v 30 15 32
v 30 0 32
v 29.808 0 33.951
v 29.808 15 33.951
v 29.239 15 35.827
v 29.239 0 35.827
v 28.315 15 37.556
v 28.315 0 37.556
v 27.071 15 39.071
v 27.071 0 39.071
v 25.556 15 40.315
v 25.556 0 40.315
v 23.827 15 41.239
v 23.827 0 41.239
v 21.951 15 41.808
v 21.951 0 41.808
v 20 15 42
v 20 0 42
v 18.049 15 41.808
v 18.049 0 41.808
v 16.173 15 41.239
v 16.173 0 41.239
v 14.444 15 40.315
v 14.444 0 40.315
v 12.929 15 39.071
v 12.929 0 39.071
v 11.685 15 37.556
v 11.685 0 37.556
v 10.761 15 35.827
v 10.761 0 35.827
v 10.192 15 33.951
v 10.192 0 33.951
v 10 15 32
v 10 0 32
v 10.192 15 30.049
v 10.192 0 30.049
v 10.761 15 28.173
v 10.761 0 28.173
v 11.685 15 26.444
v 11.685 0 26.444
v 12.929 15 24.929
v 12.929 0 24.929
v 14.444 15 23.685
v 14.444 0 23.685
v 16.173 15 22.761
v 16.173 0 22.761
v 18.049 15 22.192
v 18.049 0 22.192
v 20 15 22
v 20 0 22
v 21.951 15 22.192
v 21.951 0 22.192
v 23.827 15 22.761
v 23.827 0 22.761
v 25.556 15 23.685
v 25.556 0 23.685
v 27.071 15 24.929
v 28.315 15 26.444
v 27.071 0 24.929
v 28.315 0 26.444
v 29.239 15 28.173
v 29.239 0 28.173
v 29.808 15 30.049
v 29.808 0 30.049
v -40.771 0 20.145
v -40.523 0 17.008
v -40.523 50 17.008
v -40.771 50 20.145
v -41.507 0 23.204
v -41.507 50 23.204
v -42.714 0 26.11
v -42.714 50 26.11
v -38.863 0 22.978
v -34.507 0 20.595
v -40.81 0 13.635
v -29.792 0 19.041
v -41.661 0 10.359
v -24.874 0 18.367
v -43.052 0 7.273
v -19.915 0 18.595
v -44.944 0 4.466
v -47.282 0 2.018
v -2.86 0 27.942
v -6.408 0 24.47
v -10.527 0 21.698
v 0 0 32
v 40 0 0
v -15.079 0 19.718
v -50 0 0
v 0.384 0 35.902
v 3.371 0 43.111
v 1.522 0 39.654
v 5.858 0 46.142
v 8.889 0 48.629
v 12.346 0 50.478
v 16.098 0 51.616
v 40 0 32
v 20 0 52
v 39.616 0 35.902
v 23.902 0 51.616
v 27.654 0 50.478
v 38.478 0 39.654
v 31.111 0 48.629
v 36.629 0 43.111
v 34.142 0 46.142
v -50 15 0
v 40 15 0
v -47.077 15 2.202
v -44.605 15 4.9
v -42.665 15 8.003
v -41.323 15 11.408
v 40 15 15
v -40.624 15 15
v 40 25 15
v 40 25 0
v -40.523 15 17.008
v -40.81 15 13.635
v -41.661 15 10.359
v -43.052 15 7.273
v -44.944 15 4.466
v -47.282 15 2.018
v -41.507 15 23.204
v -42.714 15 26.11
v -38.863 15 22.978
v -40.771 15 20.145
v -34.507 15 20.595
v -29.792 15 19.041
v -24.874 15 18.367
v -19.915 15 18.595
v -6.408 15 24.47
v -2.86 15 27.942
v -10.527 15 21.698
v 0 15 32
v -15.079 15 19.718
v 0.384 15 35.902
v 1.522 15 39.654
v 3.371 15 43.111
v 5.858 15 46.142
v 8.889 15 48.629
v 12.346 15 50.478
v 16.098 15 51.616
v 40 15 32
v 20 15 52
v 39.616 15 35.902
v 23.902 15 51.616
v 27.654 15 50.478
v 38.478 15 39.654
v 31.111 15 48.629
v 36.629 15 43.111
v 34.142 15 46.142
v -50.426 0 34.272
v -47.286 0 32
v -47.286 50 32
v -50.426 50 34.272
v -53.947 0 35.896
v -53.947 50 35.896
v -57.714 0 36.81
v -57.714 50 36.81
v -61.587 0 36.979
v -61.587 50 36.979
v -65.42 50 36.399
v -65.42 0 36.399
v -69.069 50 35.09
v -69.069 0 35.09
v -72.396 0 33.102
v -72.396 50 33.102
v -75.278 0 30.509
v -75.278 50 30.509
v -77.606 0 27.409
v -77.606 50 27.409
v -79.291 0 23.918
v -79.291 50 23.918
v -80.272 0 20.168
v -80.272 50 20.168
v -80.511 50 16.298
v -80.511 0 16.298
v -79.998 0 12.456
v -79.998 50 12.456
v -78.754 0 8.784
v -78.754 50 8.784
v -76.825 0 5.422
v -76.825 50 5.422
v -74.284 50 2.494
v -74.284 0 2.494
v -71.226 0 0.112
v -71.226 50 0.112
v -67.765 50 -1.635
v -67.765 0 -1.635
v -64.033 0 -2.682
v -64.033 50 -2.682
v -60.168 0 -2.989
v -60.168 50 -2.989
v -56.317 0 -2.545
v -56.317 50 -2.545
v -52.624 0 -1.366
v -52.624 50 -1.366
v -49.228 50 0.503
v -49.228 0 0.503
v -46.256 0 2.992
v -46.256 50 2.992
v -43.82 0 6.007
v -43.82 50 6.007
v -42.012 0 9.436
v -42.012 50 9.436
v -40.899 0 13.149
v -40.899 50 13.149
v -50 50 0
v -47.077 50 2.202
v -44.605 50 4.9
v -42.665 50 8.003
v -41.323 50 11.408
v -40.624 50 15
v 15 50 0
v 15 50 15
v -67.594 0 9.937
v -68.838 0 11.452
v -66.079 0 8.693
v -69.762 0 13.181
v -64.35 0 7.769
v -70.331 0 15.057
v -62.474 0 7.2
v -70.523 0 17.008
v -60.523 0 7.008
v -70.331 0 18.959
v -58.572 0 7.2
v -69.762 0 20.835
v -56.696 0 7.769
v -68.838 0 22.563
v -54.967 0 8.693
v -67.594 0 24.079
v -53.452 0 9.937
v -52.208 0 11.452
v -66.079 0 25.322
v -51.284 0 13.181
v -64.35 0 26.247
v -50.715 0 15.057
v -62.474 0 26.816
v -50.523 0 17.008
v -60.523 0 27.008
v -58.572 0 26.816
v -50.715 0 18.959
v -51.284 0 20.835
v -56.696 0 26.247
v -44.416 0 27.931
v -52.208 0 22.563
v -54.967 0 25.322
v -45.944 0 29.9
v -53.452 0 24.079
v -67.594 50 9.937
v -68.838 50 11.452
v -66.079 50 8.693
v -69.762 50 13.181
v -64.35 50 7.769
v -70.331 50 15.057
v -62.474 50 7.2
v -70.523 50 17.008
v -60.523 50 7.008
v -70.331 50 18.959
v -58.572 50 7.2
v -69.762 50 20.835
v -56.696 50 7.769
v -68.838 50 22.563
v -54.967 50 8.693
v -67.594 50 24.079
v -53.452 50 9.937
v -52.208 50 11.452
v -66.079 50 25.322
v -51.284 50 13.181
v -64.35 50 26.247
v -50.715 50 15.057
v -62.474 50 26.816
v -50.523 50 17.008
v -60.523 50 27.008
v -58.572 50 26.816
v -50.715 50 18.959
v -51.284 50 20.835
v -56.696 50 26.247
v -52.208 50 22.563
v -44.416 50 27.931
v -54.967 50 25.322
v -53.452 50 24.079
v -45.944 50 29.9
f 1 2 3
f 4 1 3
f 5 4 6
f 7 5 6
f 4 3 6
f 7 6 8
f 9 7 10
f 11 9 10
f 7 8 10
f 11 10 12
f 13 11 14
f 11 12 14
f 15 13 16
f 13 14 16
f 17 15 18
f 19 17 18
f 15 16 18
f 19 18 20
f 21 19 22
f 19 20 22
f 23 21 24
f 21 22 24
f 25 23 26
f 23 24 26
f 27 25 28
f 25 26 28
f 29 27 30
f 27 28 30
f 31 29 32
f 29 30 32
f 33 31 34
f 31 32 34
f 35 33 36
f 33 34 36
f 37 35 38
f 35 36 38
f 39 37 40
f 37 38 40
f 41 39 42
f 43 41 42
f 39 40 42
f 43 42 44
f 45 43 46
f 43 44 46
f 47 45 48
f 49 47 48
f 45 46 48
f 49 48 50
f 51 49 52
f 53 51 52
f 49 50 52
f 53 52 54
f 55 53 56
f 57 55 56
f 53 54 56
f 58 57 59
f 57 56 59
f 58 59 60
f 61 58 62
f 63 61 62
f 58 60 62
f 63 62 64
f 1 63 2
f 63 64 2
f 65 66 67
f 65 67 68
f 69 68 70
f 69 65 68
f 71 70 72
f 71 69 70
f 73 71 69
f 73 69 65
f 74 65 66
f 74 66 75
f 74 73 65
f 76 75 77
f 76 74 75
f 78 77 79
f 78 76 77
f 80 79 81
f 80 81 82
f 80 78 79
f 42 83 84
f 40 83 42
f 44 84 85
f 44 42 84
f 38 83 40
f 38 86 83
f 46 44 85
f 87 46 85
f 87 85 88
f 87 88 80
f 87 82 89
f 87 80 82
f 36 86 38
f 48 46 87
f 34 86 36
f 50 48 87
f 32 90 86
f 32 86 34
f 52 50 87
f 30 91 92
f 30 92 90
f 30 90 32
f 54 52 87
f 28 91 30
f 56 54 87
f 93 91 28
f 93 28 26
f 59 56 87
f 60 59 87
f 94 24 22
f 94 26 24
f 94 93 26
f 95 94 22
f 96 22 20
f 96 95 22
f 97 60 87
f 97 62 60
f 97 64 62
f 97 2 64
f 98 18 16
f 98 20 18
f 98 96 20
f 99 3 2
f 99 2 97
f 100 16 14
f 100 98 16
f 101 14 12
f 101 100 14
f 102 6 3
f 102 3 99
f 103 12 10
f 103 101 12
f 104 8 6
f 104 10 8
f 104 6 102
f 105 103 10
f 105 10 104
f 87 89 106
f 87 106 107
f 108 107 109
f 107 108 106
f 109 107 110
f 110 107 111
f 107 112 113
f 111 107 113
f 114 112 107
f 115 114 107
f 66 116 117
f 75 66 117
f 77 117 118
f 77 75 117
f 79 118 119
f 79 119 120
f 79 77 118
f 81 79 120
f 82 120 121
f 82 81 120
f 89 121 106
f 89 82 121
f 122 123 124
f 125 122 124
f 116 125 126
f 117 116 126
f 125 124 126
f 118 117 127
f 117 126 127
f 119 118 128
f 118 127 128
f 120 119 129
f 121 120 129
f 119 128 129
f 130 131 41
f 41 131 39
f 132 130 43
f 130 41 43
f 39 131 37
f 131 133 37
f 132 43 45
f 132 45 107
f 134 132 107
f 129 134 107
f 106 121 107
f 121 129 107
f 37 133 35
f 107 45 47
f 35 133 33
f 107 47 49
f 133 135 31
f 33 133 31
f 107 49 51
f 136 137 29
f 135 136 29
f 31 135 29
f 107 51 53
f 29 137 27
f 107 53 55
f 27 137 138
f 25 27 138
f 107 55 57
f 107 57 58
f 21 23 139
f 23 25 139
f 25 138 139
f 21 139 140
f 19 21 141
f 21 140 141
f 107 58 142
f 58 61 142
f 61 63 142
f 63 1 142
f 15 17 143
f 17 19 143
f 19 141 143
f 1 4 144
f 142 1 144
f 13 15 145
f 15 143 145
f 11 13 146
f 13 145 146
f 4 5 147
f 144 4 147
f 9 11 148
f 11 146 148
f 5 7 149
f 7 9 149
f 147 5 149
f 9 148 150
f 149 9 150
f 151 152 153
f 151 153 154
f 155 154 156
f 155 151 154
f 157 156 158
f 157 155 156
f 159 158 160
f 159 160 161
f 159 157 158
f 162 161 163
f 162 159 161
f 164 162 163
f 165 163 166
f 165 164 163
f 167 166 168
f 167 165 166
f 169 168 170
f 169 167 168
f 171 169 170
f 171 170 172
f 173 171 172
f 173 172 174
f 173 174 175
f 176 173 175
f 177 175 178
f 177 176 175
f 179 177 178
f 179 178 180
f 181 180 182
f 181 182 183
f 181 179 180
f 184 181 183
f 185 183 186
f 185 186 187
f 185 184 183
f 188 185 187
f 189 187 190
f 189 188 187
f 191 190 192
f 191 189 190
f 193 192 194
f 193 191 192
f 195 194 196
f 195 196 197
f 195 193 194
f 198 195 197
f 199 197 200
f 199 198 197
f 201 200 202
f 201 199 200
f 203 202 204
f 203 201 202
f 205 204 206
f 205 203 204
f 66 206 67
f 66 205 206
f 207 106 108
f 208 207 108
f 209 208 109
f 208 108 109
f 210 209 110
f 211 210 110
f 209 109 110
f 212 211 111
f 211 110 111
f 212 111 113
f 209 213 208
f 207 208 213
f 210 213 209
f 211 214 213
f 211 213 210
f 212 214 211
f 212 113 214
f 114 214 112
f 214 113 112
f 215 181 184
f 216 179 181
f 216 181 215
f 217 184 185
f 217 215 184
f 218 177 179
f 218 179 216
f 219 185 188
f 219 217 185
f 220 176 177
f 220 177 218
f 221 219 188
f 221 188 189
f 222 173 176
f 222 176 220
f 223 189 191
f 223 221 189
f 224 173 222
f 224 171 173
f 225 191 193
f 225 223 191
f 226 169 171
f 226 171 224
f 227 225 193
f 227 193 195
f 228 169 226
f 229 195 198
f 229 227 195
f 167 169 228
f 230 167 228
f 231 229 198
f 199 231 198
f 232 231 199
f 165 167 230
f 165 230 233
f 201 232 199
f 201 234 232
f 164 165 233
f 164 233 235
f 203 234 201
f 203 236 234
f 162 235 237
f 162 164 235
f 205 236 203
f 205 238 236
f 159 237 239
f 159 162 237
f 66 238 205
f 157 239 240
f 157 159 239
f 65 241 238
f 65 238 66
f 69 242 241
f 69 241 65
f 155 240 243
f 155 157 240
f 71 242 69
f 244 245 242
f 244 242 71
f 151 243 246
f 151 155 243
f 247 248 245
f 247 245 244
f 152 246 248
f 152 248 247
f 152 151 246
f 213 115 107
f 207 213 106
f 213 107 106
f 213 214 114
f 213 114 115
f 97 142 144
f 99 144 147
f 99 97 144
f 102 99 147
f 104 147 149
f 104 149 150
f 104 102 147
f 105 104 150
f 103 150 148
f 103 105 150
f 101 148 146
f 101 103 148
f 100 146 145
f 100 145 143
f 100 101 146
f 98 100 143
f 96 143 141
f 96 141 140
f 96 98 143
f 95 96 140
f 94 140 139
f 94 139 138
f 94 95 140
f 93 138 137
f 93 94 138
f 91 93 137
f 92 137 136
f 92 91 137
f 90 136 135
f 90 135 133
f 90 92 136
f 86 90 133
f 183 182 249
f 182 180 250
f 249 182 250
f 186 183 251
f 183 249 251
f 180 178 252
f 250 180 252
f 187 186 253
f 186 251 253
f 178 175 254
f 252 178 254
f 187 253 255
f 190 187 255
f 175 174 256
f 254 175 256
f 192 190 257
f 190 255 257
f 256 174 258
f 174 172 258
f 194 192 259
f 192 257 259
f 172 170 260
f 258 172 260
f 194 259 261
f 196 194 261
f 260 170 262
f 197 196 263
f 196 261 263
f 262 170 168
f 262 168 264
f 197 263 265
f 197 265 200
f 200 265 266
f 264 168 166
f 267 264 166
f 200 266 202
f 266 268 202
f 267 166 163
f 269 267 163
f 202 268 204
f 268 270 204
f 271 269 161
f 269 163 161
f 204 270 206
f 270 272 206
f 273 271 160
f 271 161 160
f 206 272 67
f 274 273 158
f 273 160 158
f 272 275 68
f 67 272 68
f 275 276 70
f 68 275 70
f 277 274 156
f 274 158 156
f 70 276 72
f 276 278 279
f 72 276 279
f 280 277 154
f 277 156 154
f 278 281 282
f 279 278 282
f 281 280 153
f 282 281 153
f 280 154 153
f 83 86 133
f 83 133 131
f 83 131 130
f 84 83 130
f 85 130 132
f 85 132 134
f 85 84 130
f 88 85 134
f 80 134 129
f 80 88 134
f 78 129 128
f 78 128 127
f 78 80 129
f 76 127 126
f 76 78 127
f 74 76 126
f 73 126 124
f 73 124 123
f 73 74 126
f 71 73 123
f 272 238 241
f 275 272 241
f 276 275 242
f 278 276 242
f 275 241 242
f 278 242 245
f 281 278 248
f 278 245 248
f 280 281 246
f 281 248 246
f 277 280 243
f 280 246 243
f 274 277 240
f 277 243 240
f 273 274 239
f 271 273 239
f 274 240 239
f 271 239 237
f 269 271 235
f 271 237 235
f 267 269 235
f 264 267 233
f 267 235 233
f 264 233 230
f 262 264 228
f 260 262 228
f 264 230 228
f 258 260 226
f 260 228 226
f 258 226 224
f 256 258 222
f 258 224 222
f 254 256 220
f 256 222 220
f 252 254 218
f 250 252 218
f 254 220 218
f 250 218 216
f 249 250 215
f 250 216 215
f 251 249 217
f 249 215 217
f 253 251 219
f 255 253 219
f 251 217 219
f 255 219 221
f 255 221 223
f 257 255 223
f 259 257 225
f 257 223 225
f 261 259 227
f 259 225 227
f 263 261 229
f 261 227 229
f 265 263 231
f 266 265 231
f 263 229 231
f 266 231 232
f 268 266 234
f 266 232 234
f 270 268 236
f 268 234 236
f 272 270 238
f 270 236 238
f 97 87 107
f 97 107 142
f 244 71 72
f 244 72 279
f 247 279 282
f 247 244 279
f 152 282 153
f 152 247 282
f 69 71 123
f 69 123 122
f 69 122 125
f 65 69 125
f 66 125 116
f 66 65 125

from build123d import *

# Parameters (mm, degrees)
F0_R     = 10
F1_DEPTH = 15
F2_DEPTH = 50
F3_DEPTH = 50
F5_DEPTH = 35
F6_SIZE  = 25


with BuildPart() as f1:
    # F0 (on Front) → F1 (new body)
    with BuildSketch(Plane.XZ):
        with BuildLine():
            Line((-50, 0), (40, 0))
            Line((40, 0), (40, 32))
            ThreePointArc((40, 32), (20, 52), (0, 32))
            ThreePointArc((0, 32), (-19.9147775385, 18.5953448685), (-42.7142753659, 26.1097338935))
            ThreePointArc((-42.7142753659, 26.1097338935), (-41.0786099469, 21.6887698307), (-40.5231018317, 17.0077725714))
            ThreePointArc((-40.5231018317, 17.0077725714), (-43.0522398519, 7.2728364297), (-50, 0))
        make_face()
        with Locations((20, 32)):
            Circle(F0_R, mode=Mode.SUBTRACT)
    extrude(amount=-F1_DEPTH)

    # F0 (on Front) → F3 (cut)
    with BuildSketch(Plane.XZ):
        with Locations((-60.5231018317, 17.0077725714)):
            Circle(F0_R)
    extrude(amount=-F3_DEPTH, mode=Mode.SUBTRACT)


with BuildPart() as f2:
    # F0 (on Front) → F2 (new body)
    with BuildSketch(Plane.XZ):
        with BuildLine():
            ThreePointArc((-47.2855372246, 32), (-80.4515317098, 18.69824073), (-50, 0))
            ThreePointArc((-50, 0), (-43.0522398519, 7.2728364297), (-40.5231018317, 17.0077725714))
            ThreePointArc((-40.5231018317, 17.0077725714), (-41.0786099469, 21.6887698307), (-42.7142753659, 26.1097338935))
            ThreePointArc((-42.7142753659, 26.1097338935), (-45.2020157863, 28.8980157297), (-47.2855372246, 32))
        make_face()
        with Locations((-60.5231018317, 17.0077725714)):
            Circle(F0_R, mode=Mode.SUBTRACT)
    extrude(amount=-F2_DEPTH)


with BuildPart() as f5:
    # F4 (on face) → F5 (new body)
    with BuildSketch(Plane(origin=(0, 15, 0), x_dir=(-1, 0, 0), z_dir=(0, 1, 0))):
        with BuildLine():
            Line((40.6241357957, 15), (-40, 15))
            Line((-40, 15), (-40, 0))
            Line((-40, 0), (50, 0))
            ThreePointArc((50, 0), (43.5635749121, 6.4070911469), (40.6241357957, 15))
        make_face()
    extrude(amount=F5_DEPTH)

    # F6
    f6_edges = [f5.edges().sort_by_distance(p)[0] for p in [
        (40, 50, 7.5),
    ]]
    chamfer(f6_edges, length=F6_SIZE)


solid = Compound([f1.part, f2.part, f5.part])
